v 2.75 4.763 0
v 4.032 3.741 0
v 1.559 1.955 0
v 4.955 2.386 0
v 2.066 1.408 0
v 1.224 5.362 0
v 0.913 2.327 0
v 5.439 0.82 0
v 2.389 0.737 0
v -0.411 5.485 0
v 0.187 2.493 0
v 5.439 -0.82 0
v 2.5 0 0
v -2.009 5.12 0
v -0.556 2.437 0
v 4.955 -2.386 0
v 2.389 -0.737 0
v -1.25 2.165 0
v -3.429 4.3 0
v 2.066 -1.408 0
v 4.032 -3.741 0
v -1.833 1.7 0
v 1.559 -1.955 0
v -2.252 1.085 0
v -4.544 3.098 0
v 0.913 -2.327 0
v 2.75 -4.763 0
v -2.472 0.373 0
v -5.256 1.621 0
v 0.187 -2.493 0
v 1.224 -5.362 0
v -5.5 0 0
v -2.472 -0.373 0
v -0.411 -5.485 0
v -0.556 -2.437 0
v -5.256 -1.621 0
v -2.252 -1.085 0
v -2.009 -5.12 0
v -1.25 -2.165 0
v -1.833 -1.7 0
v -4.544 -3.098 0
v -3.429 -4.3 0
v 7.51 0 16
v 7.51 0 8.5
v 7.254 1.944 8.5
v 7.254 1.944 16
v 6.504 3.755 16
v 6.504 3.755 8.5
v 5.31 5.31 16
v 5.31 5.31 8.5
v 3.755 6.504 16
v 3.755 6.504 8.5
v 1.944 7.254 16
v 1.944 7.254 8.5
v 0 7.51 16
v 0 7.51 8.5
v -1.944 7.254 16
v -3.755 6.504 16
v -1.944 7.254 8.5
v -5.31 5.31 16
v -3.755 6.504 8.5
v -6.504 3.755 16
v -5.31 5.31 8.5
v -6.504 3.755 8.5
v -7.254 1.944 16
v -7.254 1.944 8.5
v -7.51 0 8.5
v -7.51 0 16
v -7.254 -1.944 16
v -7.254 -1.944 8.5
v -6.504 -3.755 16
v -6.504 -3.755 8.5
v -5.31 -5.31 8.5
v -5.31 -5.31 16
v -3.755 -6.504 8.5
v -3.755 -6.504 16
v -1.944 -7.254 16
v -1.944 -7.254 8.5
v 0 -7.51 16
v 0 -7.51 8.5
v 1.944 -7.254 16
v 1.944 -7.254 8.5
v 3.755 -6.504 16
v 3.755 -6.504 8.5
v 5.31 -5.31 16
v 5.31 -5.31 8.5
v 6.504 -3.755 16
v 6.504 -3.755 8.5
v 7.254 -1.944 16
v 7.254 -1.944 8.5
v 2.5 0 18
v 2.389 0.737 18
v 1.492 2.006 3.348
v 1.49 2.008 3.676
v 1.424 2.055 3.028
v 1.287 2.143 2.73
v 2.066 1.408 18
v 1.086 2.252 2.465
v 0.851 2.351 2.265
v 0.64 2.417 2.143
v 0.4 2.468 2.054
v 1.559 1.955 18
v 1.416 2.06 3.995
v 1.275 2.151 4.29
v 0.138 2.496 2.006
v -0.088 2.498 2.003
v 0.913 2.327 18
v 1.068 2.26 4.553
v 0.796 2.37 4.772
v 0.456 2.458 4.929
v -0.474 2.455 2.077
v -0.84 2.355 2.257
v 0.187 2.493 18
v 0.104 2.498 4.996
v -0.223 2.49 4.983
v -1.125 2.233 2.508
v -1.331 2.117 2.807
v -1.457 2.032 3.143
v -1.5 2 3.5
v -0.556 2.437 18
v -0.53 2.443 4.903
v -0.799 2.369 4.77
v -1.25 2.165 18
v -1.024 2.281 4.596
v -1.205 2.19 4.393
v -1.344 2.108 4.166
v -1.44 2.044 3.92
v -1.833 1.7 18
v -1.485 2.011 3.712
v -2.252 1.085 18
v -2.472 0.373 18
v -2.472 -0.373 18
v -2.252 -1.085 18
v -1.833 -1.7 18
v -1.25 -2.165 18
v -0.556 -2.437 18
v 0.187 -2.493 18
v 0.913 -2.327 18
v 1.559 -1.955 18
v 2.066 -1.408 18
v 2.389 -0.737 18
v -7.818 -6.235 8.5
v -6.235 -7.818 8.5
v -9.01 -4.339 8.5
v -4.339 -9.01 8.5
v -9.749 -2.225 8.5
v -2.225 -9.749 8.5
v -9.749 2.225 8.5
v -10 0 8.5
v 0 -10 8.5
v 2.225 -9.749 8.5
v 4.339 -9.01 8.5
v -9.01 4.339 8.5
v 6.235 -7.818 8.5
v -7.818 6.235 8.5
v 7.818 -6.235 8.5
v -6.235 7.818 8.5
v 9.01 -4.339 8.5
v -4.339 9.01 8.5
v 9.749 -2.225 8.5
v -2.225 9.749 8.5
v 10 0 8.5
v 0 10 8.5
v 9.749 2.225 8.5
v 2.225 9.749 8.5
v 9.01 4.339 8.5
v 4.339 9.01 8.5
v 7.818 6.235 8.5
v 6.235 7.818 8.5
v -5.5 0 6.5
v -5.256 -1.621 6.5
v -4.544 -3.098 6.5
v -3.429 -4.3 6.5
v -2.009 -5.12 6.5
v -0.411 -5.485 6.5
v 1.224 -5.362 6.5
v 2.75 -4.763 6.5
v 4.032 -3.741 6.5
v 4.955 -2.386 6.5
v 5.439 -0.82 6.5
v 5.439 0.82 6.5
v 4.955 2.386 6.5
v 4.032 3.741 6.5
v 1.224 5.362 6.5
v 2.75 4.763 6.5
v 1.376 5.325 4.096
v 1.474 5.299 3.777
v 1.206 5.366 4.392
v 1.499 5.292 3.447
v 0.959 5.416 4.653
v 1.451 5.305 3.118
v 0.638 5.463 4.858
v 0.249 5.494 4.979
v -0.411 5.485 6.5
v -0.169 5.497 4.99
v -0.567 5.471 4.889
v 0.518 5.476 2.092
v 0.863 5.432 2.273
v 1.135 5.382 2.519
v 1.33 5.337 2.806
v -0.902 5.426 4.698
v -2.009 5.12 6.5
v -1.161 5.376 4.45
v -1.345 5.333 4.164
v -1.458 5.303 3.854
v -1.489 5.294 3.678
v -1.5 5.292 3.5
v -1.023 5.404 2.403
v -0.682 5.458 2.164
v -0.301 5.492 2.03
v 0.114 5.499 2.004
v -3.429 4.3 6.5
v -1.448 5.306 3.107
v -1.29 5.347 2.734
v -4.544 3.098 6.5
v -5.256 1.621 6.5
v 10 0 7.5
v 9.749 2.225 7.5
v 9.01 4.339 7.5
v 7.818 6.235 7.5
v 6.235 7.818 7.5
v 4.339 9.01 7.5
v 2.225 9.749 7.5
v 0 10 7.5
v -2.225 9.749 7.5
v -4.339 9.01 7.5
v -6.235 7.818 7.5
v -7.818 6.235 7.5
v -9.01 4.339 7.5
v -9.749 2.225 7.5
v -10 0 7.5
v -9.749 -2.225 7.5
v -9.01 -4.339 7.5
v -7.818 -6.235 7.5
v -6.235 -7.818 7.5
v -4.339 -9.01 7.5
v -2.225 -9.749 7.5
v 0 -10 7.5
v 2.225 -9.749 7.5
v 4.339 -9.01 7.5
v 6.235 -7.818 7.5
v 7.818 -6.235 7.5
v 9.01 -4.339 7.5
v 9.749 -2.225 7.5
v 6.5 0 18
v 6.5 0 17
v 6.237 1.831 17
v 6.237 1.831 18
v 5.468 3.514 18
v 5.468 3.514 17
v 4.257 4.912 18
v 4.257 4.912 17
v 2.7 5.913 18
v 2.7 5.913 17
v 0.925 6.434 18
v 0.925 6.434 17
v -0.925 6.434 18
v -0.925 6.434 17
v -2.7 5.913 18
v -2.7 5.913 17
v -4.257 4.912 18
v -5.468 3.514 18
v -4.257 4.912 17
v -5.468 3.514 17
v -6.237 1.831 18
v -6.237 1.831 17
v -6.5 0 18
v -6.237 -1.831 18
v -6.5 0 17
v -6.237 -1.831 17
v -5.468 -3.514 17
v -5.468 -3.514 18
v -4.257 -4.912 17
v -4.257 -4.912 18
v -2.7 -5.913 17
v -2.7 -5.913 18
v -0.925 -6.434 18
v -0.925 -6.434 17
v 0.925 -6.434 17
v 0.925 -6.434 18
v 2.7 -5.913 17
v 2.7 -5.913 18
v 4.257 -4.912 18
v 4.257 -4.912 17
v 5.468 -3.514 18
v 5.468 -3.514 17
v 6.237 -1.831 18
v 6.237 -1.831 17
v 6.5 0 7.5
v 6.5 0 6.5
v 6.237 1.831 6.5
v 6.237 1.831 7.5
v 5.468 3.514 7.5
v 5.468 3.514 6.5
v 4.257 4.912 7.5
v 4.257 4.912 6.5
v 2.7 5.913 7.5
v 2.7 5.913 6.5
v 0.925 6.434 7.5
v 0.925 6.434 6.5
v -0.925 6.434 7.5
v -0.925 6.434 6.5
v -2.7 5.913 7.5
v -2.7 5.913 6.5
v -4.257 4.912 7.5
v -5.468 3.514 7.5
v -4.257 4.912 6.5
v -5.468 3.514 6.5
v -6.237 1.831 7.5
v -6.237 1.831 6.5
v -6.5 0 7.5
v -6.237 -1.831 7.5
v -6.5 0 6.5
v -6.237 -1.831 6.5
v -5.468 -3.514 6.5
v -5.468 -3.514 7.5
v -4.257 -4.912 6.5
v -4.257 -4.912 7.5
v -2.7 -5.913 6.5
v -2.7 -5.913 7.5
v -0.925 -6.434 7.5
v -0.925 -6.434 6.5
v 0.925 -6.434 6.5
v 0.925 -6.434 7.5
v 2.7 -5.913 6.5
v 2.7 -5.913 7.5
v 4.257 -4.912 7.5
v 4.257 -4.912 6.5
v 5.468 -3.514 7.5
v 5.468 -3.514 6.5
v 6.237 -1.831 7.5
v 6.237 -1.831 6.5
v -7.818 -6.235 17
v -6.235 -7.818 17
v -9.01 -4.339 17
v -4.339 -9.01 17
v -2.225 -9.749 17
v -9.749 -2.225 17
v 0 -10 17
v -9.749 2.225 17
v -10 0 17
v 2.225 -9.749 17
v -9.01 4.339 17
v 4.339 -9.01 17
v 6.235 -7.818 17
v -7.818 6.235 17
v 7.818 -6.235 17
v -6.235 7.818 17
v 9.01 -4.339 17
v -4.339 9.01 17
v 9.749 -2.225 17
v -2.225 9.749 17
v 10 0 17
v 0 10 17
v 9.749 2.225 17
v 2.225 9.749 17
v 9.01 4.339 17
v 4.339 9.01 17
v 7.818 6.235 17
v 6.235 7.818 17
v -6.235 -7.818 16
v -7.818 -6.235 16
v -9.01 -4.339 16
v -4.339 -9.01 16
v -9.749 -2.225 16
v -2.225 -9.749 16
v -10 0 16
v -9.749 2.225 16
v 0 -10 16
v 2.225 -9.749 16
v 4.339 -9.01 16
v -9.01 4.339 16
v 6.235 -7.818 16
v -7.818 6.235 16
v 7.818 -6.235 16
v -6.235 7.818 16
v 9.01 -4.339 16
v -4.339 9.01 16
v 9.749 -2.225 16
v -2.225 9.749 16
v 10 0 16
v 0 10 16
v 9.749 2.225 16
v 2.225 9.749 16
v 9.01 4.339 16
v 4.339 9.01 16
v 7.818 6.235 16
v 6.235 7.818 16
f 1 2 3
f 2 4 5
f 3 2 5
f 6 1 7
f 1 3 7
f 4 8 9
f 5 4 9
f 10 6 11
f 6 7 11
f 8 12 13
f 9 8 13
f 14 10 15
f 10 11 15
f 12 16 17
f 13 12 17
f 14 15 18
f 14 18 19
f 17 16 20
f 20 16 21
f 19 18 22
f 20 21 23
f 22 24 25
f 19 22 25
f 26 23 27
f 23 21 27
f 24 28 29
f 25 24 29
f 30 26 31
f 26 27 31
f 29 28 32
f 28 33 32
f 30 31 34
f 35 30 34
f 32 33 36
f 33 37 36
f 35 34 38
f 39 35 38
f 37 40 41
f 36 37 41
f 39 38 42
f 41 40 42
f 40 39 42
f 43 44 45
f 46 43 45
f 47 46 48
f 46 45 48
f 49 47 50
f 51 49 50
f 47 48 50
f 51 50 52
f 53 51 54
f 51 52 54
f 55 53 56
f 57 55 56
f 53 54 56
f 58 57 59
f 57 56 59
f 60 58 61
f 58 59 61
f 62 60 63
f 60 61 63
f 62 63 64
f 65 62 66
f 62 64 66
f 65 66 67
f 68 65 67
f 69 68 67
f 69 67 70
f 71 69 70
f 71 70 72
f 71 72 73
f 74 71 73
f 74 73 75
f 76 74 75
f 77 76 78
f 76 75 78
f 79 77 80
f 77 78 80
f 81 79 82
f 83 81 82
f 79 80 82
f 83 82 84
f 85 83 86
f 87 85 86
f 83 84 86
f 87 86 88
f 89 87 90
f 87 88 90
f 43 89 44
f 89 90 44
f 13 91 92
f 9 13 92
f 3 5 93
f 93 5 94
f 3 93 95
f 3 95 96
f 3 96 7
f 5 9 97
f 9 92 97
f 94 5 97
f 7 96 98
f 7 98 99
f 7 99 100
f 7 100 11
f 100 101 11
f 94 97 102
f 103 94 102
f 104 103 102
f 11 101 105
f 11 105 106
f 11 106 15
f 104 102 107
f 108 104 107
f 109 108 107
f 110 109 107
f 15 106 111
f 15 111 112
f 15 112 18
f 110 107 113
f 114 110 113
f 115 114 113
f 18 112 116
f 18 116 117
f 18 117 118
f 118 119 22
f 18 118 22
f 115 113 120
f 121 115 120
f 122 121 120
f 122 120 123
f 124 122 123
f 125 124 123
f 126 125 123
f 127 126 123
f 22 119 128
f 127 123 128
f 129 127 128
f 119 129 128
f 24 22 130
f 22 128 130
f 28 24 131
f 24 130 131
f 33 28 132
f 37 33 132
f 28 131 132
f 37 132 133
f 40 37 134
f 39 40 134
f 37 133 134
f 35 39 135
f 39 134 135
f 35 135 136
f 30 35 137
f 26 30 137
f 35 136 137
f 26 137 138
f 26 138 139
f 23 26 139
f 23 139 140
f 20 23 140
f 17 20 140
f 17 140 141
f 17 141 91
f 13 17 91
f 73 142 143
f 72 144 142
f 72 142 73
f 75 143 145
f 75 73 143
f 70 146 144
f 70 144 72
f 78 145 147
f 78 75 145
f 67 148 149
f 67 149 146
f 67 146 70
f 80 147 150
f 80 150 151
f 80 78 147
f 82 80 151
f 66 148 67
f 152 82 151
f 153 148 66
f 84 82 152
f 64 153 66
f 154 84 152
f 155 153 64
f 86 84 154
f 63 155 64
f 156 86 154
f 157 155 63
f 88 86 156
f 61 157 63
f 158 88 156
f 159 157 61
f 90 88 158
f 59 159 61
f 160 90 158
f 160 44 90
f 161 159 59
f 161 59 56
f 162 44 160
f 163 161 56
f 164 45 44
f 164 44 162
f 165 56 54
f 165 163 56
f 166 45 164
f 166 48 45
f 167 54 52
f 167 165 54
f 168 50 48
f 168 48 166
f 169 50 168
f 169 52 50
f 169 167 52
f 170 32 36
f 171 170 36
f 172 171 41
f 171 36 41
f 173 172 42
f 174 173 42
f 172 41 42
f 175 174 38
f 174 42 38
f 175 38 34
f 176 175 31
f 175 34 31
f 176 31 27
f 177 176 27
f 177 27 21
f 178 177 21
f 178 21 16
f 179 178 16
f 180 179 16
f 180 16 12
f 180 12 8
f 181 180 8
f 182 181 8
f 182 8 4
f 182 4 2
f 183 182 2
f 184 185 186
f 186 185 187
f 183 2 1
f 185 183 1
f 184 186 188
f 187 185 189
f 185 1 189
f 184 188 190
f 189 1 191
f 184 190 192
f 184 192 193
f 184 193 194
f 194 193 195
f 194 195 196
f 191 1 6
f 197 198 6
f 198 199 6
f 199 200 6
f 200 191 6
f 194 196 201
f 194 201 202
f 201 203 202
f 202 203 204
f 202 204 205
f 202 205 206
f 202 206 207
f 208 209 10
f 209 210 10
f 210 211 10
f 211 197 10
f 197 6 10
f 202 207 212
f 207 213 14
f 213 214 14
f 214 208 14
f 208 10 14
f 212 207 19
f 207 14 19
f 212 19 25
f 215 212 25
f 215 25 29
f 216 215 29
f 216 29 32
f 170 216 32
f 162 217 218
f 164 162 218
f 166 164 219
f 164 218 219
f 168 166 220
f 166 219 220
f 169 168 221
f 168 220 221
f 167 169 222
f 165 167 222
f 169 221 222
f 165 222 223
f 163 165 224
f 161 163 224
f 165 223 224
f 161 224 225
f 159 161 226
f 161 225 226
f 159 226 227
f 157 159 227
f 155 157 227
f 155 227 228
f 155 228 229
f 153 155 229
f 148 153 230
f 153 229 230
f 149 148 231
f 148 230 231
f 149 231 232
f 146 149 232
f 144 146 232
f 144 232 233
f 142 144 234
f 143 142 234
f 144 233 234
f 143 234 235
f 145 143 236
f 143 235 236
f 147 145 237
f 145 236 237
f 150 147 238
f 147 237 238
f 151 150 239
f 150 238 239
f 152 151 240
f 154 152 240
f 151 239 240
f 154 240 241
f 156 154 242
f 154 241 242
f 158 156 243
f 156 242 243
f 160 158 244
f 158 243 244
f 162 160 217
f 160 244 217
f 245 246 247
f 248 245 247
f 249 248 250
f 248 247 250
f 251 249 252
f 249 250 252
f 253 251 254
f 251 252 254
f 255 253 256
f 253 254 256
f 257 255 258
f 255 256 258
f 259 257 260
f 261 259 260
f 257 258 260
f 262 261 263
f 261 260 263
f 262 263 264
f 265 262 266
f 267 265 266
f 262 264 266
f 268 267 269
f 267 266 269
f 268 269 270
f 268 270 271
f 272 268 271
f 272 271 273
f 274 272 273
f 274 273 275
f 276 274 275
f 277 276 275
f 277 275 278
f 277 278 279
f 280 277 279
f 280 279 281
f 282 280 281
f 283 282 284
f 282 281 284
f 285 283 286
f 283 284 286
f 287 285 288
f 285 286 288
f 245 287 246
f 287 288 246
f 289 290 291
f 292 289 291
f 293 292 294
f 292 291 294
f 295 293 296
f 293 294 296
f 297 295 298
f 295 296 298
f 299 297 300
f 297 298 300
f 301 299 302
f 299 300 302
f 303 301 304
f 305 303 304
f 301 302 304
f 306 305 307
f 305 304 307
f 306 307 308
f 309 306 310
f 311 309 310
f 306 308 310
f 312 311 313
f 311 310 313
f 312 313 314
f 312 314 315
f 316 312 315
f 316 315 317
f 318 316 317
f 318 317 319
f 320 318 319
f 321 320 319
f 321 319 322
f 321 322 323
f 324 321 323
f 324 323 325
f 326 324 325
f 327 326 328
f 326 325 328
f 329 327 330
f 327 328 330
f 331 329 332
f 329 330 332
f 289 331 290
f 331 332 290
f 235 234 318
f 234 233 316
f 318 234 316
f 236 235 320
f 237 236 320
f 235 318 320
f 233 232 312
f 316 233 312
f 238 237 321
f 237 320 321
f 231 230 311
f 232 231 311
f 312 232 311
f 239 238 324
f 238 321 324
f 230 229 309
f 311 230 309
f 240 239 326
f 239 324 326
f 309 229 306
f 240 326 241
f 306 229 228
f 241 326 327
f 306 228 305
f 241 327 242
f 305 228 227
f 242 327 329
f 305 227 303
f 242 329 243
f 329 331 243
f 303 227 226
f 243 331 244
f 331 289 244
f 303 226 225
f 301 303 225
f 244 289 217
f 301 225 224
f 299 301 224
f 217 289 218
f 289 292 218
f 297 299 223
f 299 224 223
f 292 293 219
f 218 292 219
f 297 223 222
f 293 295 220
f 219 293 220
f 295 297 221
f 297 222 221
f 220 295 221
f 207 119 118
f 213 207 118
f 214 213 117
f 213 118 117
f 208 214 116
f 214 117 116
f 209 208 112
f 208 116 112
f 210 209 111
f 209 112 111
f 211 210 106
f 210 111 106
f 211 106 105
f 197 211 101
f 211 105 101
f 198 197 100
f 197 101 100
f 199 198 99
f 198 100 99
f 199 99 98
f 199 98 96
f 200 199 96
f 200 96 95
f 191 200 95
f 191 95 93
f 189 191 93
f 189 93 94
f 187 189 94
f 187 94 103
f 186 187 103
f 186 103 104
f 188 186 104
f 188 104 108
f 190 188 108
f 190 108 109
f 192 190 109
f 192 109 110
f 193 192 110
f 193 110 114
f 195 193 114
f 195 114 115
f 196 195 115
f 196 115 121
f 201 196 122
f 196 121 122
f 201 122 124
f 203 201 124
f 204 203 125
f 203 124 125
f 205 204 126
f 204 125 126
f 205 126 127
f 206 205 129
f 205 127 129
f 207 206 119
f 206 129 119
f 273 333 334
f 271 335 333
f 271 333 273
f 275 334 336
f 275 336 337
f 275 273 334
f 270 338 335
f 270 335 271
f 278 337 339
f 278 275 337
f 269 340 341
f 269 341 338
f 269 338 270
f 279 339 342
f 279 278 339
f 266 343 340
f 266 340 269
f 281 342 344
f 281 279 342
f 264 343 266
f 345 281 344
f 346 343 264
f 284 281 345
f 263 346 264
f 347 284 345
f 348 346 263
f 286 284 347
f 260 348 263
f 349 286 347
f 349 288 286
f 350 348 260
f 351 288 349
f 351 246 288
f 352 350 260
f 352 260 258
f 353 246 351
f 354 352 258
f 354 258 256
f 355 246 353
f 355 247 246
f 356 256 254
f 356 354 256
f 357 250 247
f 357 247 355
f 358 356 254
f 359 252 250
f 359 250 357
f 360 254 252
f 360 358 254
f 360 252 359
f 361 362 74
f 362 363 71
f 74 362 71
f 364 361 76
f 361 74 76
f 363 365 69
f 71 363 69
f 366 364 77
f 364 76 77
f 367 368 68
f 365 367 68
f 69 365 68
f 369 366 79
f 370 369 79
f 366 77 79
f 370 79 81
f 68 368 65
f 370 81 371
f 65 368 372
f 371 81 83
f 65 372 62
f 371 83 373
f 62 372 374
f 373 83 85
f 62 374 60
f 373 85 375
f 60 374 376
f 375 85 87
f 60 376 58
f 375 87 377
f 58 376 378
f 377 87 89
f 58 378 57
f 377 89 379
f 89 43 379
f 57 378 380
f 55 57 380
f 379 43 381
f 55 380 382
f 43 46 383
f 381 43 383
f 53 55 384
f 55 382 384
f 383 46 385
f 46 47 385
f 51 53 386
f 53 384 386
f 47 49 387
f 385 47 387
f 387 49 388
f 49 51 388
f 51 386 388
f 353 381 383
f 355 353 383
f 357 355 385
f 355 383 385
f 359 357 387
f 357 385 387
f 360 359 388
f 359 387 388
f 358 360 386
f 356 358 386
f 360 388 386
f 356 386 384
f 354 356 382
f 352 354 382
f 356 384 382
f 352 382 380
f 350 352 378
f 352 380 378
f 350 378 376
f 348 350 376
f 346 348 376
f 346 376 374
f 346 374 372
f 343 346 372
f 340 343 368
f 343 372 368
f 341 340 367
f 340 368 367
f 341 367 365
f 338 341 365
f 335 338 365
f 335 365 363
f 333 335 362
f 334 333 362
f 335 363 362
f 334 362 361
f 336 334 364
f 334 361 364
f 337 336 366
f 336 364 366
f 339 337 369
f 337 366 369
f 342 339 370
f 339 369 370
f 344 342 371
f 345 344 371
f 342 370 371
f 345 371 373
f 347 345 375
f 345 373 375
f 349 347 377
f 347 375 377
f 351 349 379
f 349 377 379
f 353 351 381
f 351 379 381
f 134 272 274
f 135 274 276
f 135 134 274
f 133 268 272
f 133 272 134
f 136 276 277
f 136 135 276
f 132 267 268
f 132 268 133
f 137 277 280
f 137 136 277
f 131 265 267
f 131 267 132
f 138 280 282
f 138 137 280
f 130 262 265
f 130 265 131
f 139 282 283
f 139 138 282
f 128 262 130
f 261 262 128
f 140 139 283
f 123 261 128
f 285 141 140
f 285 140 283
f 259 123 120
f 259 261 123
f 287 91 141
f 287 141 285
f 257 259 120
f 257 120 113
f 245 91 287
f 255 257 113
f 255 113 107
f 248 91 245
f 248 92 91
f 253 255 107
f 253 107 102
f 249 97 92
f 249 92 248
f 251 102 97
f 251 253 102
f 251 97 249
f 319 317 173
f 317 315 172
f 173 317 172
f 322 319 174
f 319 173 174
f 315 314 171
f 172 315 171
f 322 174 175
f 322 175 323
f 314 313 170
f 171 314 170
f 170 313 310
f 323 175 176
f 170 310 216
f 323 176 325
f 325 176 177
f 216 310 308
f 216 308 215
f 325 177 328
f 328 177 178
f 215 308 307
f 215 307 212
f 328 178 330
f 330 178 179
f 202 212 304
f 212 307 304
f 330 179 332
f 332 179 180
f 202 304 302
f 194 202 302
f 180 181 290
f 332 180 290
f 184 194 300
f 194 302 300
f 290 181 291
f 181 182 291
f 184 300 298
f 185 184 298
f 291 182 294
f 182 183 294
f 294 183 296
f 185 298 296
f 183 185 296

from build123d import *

# Parameters (mm, degrees)
SKETCH1_R                 = 5.5
BOSS_EXTRUDE1_DEPTH       = 6.5
SKETCH2_R                 = 6.5
BOSS_EXTRUDE2_DEPTH       = 1
SKETCH3_R                 = 10
BOSS_EXTRUDE3_DEPTH       = 1
SKETCH4_R                 = 7.51
BOSS_EXTRUDE4_DEPTH       = 7.5
SKETCH5_R                 = 10
BOSS_EXTRUDE5_DEPTH       = 1
SKETCH6_R                 = 6.5
BOSS_EXTRUDE6_DEPTH       = 1
SKETCH7_R                 = 2.5
CUT_EXTRUDE1_DEPTH        = 23.891046285
F_3_0MM_DOWEL_HOLE1_D     = 3
F_3_0MM_DOWEL_HOLE1_DEPTH = 5.5
F_3_0MM_DOWEL_HOLE1_TIP   = 0.901290929


with BuildPart() as part:
    # Sketch1 → Boss-Extrude1 (new body)
    with BuildSketch(Plane.XY):
        with Locations(Location((0, 0, 0), (0, 0, 180))):
            Circle(SKETCH1_R)
    extrude(amount=BOSS_EXTRUDE1_DEPTH)

    # Sketch2 → Boss-Extrude2 (add)
    with BuildSketch(Plane.XY.offset(6.5)):
        Circle(SKETCH2_R)
    extrude(amount=BOSS_EXTRUDE2_DEPTH)

    # Sketch3 → Boss-Extrude3 (add)
    with BuildSketch(Plane.XY.offset(7.5)):
        Circle(SKETCH3_R)
    extrude(amount=BOSS_EXTRUDE3_DEPTH)

    # Sketch4 → Boss-Extrude4 (add)
    with BuildSketch(Plane.XY.offset(8.5)):
        Circle(SKETCH4_R)
    extrude(amount=BOSS_EXTRUDE4_DEPTH)

    # Sketch5 → Boss-Extrude5 (add)
    with BuildSketch(Plane.XY.offset(16)):
        Circle(SKETCH5_R)
    extrude(amount=BOSS_EXTRUDE5_DEPTH)

    # Sketch6 → Boss-Extrude6 (add)
    with BuildSketch(Plane.XY.offset(17)):
        Circle(SKETCH6_R)
    extrude(amount=BOSS_EXTRUDE6_DEPTH)

    # Sketch7 → Cut-Extrude1 (cut, through all)
    with BuildSketch(Plane.XY.offset(18)):
        Circle(SKETCH7_R)
    extrude(amount=-CUT_EXTRUDE1_DEPTH, mode=Mode.SUBTRACT)

    # Ø3.0mm Dowel Hole1
    with Locations(Plane(origin=(0, 5.5, 3.5), x_dir=(1, 0, 0), z_dir=(0, 1, 0))):
        with Locations((0, 0)):
            Hole(F_3_0MM_DOWEL_HOLE1_D / 2, depth=F_3_0MM_DOWEL_HOLE1_DEPTH)
            with Locations((0, 0, -(F_3_0MM_DOWEL_HOLE1_DEPTH + F_3_0MM_DOWEL_HOLE1_TIP / 2))):  # 118° drill point
                Cone(0, F_3_0MM_DOWEL_HOLE1_D / 2, F_3_0MM_DOWEL_HOLE1_TIP, mode=Mode.SUBTRACT)


solid = part.part
